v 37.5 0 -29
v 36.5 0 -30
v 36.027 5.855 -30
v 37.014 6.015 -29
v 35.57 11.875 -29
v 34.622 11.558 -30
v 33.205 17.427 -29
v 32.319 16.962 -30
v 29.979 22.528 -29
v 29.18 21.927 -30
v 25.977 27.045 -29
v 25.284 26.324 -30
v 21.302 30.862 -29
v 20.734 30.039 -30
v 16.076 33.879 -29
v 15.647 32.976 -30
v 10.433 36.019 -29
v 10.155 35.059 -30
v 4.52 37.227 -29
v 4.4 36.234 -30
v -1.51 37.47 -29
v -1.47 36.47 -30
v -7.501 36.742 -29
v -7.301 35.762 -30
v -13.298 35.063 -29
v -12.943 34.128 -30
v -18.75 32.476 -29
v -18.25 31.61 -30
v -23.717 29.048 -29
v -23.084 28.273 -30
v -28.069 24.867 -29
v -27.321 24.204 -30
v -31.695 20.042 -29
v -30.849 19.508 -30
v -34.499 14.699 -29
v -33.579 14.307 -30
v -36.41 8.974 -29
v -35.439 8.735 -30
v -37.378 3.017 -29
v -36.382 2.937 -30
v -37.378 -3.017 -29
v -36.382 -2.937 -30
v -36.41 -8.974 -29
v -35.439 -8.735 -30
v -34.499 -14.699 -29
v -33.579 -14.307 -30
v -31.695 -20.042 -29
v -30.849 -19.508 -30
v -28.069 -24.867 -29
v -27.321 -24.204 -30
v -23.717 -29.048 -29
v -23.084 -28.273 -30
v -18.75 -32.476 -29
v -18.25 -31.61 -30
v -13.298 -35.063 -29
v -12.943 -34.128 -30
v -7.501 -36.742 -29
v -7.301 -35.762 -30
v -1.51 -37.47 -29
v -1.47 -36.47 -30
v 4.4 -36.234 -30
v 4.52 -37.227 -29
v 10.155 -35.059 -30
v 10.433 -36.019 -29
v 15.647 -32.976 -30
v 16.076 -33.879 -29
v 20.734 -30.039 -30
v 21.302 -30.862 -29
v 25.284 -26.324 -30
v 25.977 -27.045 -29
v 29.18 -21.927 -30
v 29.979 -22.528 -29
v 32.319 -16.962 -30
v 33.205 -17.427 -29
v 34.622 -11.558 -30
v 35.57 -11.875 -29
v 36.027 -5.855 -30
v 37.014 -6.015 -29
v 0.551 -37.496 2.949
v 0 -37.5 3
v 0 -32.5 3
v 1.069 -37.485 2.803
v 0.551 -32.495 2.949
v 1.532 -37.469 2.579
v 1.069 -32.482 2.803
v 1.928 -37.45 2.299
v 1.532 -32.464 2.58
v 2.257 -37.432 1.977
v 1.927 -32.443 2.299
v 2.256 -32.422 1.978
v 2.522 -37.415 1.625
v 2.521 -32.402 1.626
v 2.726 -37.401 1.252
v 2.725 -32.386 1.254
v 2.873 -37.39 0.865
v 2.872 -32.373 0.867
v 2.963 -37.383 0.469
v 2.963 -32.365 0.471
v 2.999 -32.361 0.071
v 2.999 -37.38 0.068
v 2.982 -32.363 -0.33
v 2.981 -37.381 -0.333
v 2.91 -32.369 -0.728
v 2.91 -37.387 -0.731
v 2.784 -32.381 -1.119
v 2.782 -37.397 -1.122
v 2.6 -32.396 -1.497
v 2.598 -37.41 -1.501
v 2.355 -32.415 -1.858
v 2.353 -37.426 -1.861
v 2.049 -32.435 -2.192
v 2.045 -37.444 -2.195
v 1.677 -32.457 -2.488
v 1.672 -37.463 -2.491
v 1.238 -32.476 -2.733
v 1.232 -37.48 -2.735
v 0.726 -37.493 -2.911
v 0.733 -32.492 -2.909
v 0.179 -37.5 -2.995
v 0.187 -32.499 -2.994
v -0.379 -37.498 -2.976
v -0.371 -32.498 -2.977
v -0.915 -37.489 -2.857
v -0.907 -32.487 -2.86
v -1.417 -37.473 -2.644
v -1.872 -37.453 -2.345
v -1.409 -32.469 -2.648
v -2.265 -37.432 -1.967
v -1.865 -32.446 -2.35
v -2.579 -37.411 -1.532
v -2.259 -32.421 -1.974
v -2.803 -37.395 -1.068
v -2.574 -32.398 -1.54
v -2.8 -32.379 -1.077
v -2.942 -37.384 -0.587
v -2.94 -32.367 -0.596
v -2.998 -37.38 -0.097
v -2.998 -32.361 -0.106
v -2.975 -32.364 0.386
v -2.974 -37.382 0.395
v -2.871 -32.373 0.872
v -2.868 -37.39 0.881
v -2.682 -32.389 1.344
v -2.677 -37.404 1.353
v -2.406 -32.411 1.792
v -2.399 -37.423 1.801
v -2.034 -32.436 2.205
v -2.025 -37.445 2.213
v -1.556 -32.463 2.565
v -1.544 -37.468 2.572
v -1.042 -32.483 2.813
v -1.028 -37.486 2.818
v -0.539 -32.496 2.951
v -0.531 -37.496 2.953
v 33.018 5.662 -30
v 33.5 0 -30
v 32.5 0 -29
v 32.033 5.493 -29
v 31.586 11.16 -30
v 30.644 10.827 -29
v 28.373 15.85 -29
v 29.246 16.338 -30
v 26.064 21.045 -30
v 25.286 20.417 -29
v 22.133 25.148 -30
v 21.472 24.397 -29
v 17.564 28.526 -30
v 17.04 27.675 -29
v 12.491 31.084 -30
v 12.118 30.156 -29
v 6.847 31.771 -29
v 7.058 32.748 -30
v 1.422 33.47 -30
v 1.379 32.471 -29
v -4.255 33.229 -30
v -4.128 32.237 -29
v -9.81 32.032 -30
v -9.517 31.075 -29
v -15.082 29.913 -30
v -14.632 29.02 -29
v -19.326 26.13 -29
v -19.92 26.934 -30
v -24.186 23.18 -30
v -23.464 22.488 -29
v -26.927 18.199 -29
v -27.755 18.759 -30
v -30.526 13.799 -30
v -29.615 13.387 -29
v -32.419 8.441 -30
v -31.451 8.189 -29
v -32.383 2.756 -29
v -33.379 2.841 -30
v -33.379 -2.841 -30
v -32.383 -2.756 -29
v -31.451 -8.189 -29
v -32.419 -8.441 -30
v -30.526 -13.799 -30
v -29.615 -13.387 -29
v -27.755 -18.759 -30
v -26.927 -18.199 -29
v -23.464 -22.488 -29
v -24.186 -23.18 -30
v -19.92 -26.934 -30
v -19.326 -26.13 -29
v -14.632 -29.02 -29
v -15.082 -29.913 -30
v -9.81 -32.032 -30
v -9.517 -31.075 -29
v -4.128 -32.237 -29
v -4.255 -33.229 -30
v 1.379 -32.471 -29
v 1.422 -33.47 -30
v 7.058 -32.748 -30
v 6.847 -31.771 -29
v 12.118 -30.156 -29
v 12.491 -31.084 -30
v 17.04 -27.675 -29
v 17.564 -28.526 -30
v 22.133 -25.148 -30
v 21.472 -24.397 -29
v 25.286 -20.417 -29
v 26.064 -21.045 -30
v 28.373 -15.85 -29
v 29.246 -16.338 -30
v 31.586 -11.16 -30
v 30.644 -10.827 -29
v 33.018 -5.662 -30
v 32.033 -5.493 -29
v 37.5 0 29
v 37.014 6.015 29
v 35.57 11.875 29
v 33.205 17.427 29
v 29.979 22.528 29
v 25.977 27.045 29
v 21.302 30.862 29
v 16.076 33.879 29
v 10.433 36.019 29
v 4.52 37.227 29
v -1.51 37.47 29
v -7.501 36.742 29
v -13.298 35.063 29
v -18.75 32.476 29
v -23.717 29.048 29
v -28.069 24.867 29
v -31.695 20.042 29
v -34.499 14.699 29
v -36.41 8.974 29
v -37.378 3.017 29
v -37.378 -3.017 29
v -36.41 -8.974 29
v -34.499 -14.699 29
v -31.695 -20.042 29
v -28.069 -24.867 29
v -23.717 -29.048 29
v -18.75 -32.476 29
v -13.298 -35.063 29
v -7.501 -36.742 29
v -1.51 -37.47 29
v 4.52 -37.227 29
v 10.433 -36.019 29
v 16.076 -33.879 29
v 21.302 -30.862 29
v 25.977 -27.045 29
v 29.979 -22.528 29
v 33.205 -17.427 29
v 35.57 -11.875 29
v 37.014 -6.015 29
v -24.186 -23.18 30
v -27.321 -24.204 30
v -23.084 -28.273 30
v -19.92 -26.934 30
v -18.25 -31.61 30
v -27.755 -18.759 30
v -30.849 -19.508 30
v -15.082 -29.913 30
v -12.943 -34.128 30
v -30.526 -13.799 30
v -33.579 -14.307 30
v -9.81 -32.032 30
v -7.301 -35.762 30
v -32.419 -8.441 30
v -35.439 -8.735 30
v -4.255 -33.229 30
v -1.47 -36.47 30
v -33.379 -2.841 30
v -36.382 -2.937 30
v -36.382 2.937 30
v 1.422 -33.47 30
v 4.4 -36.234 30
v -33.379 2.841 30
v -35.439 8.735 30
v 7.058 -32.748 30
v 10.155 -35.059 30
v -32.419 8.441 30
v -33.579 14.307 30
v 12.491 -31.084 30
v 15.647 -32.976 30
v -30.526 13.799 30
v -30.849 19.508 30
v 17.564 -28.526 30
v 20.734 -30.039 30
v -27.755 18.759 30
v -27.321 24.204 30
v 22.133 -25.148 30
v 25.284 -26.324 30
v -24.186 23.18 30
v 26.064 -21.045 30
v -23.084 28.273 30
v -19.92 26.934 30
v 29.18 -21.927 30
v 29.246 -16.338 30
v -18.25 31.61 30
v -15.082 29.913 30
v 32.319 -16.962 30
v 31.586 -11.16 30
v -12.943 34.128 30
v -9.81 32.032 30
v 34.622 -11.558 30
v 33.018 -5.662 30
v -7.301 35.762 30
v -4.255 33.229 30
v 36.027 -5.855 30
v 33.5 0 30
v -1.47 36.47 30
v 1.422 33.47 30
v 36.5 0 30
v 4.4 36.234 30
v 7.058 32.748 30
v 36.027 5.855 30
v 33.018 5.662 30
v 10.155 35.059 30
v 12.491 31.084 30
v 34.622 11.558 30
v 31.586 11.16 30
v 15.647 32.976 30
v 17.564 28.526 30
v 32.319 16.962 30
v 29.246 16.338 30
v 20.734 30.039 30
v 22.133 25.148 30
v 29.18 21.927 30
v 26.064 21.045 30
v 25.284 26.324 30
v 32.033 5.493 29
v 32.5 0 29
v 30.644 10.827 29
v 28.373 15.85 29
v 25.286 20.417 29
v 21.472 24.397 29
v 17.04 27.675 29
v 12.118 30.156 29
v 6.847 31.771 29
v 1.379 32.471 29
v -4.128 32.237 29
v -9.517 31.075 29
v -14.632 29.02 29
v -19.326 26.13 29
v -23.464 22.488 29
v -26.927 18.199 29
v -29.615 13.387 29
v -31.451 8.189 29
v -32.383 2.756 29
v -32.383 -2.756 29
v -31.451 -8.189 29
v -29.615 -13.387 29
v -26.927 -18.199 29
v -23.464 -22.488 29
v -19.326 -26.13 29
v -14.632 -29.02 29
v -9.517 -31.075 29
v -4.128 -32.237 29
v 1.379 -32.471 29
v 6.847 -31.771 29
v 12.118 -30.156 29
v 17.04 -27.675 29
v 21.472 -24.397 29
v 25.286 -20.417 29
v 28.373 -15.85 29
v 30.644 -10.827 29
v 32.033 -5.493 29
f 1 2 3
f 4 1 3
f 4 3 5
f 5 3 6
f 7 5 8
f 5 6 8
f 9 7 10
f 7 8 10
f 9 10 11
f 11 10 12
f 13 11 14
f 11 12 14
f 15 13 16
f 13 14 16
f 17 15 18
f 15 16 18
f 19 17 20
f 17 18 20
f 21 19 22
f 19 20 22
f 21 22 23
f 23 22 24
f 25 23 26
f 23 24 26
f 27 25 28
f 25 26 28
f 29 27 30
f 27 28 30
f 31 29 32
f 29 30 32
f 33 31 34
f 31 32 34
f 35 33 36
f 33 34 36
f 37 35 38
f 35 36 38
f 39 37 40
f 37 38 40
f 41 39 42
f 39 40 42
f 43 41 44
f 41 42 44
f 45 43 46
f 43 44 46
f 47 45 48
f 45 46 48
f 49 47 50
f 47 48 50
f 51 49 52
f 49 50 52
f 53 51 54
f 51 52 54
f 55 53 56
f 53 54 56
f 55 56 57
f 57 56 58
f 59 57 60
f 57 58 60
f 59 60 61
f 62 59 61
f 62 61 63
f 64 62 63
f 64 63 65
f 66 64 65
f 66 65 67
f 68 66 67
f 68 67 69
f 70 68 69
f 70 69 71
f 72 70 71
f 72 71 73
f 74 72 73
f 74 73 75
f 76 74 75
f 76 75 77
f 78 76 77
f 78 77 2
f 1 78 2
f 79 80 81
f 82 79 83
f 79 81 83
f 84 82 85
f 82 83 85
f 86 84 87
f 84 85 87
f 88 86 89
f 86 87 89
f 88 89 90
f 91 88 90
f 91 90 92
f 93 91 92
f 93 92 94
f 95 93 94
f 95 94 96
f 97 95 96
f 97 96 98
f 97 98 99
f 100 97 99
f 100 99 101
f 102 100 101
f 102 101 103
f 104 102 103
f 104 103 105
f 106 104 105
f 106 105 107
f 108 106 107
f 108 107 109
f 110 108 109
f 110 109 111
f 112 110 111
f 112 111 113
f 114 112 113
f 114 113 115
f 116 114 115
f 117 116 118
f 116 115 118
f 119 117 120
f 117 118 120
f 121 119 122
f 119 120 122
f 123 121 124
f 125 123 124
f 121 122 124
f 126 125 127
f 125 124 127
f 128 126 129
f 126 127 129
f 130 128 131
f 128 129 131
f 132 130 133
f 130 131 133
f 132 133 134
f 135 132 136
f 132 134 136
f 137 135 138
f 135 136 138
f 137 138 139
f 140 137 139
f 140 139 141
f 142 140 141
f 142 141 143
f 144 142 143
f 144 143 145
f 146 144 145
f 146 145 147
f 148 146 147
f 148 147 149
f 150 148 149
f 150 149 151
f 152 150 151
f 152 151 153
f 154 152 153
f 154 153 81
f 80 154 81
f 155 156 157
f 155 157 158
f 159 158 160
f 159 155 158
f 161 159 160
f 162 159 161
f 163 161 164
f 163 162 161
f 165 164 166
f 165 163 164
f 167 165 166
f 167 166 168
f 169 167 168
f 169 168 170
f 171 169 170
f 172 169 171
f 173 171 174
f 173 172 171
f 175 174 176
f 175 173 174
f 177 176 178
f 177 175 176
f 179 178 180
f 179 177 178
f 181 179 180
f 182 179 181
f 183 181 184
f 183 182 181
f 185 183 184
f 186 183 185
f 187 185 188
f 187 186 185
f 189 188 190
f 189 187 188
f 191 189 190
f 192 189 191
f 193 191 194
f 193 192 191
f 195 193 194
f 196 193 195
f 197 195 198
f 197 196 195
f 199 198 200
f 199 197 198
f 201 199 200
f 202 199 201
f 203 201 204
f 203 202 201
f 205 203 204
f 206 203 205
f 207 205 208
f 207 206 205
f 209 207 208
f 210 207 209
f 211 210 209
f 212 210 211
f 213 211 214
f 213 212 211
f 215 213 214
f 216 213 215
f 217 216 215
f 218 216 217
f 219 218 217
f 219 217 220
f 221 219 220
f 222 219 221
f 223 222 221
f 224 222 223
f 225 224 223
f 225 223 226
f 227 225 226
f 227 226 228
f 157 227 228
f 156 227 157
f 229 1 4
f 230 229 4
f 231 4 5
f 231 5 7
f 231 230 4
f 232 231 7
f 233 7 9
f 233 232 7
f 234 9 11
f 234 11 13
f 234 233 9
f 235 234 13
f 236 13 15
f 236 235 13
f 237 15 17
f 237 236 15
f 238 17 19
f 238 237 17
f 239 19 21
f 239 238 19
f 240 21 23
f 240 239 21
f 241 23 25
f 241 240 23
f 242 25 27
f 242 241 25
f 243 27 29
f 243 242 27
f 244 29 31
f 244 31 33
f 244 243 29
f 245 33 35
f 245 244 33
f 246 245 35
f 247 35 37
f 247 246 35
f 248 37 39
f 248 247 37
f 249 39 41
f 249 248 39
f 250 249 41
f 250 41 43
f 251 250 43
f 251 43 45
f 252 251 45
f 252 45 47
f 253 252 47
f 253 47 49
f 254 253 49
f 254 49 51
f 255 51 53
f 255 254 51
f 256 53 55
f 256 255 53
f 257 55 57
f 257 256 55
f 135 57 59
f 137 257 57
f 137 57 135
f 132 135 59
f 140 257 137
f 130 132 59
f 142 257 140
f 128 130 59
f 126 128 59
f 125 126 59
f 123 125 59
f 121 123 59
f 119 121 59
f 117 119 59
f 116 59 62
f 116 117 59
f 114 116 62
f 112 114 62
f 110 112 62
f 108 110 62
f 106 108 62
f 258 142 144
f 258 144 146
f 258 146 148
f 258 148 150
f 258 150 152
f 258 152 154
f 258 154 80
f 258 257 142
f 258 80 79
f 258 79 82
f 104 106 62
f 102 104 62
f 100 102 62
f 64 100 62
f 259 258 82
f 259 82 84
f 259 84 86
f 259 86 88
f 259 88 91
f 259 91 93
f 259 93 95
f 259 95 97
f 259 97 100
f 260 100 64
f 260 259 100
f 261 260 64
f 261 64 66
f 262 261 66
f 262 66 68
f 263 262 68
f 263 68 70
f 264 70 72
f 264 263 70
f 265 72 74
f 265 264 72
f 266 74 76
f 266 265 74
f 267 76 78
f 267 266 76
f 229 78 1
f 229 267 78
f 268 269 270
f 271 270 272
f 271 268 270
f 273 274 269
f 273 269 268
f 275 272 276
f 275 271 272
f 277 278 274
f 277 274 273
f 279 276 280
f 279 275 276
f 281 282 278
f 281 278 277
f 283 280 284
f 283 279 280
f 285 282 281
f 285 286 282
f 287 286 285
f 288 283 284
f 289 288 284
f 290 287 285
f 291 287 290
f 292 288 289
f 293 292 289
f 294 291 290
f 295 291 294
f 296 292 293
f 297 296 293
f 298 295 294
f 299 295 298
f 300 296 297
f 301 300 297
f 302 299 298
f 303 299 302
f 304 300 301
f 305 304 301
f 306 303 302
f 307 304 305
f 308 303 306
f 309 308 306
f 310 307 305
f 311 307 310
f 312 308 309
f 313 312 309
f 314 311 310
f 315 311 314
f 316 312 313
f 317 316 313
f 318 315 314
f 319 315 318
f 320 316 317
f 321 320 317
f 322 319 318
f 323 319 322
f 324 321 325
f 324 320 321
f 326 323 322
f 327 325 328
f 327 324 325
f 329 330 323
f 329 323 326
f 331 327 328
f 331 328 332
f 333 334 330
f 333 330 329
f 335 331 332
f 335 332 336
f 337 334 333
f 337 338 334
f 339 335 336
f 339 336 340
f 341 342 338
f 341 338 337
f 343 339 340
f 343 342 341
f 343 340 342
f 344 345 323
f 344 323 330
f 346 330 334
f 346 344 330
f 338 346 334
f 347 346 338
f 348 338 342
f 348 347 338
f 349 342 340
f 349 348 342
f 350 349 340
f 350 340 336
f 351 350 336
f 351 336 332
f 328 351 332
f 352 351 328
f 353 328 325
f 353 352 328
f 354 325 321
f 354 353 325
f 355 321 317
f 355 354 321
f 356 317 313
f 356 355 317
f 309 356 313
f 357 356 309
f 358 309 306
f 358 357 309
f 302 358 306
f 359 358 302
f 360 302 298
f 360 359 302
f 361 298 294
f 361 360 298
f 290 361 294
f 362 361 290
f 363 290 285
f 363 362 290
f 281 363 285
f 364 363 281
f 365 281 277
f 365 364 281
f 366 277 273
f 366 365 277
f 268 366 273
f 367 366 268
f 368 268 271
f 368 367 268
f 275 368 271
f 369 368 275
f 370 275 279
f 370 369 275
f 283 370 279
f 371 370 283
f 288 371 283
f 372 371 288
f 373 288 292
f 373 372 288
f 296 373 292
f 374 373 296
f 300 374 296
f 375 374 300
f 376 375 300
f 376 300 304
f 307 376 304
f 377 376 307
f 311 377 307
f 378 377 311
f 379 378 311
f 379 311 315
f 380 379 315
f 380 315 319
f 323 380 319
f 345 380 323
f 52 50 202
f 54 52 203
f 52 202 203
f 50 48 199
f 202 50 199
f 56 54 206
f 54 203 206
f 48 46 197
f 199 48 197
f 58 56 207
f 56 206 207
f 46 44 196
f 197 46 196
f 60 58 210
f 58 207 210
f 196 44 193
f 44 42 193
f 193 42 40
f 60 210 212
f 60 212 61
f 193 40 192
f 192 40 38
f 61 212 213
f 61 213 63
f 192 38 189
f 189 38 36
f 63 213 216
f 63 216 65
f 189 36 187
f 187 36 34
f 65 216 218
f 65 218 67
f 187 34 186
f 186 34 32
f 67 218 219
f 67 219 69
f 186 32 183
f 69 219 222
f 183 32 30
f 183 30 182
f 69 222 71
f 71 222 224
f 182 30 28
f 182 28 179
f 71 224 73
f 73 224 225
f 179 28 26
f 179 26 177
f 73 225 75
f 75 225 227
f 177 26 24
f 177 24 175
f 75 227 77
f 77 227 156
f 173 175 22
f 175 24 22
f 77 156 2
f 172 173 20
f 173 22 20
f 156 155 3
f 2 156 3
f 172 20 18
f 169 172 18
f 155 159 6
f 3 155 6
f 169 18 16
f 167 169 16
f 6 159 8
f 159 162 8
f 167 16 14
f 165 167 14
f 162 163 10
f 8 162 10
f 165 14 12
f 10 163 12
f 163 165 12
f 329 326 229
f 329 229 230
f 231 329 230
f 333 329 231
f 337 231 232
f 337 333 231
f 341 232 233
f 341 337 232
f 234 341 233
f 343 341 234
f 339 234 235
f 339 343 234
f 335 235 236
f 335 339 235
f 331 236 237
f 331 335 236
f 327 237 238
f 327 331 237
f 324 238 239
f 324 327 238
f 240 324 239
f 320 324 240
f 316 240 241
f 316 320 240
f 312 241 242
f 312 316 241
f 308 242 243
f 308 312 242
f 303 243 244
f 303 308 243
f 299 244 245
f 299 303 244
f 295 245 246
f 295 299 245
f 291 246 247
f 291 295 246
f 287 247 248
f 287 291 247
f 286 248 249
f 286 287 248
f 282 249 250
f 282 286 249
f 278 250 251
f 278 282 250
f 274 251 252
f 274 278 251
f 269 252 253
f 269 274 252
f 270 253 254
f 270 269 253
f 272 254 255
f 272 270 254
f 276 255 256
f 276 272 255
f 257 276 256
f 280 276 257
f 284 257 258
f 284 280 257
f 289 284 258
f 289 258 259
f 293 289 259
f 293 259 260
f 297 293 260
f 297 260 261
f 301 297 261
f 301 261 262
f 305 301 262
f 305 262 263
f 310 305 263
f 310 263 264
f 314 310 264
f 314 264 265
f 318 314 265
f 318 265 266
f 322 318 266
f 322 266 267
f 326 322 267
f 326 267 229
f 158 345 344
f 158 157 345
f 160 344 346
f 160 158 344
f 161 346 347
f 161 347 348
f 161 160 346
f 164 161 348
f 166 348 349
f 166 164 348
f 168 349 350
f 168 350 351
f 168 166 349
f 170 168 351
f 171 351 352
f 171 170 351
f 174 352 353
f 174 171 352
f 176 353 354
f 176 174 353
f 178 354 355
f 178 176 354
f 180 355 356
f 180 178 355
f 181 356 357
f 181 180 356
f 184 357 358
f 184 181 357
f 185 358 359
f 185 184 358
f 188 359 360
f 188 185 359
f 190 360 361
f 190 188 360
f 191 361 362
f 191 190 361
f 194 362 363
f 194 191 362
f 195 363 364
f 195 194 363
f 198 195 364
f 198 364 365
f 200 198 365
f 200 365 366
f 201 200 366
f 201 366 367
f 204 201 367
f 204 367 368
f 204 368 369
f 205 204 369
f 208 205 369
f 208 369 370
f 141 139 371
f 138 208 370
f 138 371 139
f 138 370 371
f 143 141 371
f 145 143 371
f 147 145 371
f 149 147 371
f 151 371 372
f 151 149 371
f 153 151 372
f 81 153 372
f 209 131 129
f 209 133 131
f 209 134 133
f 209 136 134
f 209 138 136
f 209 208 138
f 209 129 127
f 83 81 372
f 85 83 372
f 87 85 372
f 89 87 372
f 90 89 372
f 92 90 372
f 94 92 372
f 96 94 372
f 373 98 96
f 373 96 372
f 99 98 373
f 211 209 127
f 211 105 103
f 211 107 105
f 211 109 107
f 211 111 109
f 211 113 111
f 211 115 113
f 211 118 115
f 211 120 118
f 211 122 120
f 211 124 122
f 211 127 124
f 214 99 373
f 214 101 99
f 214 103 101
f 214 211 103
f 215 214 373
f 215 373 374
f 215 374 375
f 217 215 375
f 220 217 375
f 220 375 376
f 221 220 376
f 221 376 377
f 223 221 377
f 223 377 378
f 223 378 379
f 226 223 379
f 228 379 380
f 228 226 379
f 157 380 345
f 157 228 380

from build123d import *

# Parameters (mm, degrees)
SKETCH_1_R          = 37.5
SKETCH_1_R_2        = 32.5
EXTRUDE_1_DEPTH     = 30
CHAMFER_1_SIZE      = 1
SKETCH_2_R          = 3
CUT_EXTRUDE_1_DEPTH = 61.930288035


with BuildPart() as part:
    # 草图1 → 凸台-拉伸1 (new, symmetric)
    with BuildSketch(Plane.XY):
        Circle(SKETCH_1_R)
        Circle(SKETCH_1_R_2, mode=Mode.SUBTRACT)
    extrude(amount=EXTRUDE_1_DEPTH, both=True)

    # 倒角1
    chamfer_1_edges = [part.edges().sort_by_distance(p)[0] for p in [
        (-37.5, 0, -30),
        (-37.5, 0, 30),
        (-32.5, 0, -30),
        (-32.5, 0, 30),
    ]]
    chamfer(chamfer_1_edges, length=CHAMFER_1_SIZE)

    # 草图2 → 切除-拉伸1 (cut, through all)
    with BuildSketch(Plane(origin=(0, 0, 0), x_dir=(1, 0, 0), z_dir=(0, 1, 0))):
        with Locations(Location((0, 0, 0), (0, 0, 270))):
            Circle(SKETCH_2_R)
    extrude(amount=-CUT_EXTRUDE_1_DEPTH, mode=Mode.SUBTRACT)


solid = part.part
